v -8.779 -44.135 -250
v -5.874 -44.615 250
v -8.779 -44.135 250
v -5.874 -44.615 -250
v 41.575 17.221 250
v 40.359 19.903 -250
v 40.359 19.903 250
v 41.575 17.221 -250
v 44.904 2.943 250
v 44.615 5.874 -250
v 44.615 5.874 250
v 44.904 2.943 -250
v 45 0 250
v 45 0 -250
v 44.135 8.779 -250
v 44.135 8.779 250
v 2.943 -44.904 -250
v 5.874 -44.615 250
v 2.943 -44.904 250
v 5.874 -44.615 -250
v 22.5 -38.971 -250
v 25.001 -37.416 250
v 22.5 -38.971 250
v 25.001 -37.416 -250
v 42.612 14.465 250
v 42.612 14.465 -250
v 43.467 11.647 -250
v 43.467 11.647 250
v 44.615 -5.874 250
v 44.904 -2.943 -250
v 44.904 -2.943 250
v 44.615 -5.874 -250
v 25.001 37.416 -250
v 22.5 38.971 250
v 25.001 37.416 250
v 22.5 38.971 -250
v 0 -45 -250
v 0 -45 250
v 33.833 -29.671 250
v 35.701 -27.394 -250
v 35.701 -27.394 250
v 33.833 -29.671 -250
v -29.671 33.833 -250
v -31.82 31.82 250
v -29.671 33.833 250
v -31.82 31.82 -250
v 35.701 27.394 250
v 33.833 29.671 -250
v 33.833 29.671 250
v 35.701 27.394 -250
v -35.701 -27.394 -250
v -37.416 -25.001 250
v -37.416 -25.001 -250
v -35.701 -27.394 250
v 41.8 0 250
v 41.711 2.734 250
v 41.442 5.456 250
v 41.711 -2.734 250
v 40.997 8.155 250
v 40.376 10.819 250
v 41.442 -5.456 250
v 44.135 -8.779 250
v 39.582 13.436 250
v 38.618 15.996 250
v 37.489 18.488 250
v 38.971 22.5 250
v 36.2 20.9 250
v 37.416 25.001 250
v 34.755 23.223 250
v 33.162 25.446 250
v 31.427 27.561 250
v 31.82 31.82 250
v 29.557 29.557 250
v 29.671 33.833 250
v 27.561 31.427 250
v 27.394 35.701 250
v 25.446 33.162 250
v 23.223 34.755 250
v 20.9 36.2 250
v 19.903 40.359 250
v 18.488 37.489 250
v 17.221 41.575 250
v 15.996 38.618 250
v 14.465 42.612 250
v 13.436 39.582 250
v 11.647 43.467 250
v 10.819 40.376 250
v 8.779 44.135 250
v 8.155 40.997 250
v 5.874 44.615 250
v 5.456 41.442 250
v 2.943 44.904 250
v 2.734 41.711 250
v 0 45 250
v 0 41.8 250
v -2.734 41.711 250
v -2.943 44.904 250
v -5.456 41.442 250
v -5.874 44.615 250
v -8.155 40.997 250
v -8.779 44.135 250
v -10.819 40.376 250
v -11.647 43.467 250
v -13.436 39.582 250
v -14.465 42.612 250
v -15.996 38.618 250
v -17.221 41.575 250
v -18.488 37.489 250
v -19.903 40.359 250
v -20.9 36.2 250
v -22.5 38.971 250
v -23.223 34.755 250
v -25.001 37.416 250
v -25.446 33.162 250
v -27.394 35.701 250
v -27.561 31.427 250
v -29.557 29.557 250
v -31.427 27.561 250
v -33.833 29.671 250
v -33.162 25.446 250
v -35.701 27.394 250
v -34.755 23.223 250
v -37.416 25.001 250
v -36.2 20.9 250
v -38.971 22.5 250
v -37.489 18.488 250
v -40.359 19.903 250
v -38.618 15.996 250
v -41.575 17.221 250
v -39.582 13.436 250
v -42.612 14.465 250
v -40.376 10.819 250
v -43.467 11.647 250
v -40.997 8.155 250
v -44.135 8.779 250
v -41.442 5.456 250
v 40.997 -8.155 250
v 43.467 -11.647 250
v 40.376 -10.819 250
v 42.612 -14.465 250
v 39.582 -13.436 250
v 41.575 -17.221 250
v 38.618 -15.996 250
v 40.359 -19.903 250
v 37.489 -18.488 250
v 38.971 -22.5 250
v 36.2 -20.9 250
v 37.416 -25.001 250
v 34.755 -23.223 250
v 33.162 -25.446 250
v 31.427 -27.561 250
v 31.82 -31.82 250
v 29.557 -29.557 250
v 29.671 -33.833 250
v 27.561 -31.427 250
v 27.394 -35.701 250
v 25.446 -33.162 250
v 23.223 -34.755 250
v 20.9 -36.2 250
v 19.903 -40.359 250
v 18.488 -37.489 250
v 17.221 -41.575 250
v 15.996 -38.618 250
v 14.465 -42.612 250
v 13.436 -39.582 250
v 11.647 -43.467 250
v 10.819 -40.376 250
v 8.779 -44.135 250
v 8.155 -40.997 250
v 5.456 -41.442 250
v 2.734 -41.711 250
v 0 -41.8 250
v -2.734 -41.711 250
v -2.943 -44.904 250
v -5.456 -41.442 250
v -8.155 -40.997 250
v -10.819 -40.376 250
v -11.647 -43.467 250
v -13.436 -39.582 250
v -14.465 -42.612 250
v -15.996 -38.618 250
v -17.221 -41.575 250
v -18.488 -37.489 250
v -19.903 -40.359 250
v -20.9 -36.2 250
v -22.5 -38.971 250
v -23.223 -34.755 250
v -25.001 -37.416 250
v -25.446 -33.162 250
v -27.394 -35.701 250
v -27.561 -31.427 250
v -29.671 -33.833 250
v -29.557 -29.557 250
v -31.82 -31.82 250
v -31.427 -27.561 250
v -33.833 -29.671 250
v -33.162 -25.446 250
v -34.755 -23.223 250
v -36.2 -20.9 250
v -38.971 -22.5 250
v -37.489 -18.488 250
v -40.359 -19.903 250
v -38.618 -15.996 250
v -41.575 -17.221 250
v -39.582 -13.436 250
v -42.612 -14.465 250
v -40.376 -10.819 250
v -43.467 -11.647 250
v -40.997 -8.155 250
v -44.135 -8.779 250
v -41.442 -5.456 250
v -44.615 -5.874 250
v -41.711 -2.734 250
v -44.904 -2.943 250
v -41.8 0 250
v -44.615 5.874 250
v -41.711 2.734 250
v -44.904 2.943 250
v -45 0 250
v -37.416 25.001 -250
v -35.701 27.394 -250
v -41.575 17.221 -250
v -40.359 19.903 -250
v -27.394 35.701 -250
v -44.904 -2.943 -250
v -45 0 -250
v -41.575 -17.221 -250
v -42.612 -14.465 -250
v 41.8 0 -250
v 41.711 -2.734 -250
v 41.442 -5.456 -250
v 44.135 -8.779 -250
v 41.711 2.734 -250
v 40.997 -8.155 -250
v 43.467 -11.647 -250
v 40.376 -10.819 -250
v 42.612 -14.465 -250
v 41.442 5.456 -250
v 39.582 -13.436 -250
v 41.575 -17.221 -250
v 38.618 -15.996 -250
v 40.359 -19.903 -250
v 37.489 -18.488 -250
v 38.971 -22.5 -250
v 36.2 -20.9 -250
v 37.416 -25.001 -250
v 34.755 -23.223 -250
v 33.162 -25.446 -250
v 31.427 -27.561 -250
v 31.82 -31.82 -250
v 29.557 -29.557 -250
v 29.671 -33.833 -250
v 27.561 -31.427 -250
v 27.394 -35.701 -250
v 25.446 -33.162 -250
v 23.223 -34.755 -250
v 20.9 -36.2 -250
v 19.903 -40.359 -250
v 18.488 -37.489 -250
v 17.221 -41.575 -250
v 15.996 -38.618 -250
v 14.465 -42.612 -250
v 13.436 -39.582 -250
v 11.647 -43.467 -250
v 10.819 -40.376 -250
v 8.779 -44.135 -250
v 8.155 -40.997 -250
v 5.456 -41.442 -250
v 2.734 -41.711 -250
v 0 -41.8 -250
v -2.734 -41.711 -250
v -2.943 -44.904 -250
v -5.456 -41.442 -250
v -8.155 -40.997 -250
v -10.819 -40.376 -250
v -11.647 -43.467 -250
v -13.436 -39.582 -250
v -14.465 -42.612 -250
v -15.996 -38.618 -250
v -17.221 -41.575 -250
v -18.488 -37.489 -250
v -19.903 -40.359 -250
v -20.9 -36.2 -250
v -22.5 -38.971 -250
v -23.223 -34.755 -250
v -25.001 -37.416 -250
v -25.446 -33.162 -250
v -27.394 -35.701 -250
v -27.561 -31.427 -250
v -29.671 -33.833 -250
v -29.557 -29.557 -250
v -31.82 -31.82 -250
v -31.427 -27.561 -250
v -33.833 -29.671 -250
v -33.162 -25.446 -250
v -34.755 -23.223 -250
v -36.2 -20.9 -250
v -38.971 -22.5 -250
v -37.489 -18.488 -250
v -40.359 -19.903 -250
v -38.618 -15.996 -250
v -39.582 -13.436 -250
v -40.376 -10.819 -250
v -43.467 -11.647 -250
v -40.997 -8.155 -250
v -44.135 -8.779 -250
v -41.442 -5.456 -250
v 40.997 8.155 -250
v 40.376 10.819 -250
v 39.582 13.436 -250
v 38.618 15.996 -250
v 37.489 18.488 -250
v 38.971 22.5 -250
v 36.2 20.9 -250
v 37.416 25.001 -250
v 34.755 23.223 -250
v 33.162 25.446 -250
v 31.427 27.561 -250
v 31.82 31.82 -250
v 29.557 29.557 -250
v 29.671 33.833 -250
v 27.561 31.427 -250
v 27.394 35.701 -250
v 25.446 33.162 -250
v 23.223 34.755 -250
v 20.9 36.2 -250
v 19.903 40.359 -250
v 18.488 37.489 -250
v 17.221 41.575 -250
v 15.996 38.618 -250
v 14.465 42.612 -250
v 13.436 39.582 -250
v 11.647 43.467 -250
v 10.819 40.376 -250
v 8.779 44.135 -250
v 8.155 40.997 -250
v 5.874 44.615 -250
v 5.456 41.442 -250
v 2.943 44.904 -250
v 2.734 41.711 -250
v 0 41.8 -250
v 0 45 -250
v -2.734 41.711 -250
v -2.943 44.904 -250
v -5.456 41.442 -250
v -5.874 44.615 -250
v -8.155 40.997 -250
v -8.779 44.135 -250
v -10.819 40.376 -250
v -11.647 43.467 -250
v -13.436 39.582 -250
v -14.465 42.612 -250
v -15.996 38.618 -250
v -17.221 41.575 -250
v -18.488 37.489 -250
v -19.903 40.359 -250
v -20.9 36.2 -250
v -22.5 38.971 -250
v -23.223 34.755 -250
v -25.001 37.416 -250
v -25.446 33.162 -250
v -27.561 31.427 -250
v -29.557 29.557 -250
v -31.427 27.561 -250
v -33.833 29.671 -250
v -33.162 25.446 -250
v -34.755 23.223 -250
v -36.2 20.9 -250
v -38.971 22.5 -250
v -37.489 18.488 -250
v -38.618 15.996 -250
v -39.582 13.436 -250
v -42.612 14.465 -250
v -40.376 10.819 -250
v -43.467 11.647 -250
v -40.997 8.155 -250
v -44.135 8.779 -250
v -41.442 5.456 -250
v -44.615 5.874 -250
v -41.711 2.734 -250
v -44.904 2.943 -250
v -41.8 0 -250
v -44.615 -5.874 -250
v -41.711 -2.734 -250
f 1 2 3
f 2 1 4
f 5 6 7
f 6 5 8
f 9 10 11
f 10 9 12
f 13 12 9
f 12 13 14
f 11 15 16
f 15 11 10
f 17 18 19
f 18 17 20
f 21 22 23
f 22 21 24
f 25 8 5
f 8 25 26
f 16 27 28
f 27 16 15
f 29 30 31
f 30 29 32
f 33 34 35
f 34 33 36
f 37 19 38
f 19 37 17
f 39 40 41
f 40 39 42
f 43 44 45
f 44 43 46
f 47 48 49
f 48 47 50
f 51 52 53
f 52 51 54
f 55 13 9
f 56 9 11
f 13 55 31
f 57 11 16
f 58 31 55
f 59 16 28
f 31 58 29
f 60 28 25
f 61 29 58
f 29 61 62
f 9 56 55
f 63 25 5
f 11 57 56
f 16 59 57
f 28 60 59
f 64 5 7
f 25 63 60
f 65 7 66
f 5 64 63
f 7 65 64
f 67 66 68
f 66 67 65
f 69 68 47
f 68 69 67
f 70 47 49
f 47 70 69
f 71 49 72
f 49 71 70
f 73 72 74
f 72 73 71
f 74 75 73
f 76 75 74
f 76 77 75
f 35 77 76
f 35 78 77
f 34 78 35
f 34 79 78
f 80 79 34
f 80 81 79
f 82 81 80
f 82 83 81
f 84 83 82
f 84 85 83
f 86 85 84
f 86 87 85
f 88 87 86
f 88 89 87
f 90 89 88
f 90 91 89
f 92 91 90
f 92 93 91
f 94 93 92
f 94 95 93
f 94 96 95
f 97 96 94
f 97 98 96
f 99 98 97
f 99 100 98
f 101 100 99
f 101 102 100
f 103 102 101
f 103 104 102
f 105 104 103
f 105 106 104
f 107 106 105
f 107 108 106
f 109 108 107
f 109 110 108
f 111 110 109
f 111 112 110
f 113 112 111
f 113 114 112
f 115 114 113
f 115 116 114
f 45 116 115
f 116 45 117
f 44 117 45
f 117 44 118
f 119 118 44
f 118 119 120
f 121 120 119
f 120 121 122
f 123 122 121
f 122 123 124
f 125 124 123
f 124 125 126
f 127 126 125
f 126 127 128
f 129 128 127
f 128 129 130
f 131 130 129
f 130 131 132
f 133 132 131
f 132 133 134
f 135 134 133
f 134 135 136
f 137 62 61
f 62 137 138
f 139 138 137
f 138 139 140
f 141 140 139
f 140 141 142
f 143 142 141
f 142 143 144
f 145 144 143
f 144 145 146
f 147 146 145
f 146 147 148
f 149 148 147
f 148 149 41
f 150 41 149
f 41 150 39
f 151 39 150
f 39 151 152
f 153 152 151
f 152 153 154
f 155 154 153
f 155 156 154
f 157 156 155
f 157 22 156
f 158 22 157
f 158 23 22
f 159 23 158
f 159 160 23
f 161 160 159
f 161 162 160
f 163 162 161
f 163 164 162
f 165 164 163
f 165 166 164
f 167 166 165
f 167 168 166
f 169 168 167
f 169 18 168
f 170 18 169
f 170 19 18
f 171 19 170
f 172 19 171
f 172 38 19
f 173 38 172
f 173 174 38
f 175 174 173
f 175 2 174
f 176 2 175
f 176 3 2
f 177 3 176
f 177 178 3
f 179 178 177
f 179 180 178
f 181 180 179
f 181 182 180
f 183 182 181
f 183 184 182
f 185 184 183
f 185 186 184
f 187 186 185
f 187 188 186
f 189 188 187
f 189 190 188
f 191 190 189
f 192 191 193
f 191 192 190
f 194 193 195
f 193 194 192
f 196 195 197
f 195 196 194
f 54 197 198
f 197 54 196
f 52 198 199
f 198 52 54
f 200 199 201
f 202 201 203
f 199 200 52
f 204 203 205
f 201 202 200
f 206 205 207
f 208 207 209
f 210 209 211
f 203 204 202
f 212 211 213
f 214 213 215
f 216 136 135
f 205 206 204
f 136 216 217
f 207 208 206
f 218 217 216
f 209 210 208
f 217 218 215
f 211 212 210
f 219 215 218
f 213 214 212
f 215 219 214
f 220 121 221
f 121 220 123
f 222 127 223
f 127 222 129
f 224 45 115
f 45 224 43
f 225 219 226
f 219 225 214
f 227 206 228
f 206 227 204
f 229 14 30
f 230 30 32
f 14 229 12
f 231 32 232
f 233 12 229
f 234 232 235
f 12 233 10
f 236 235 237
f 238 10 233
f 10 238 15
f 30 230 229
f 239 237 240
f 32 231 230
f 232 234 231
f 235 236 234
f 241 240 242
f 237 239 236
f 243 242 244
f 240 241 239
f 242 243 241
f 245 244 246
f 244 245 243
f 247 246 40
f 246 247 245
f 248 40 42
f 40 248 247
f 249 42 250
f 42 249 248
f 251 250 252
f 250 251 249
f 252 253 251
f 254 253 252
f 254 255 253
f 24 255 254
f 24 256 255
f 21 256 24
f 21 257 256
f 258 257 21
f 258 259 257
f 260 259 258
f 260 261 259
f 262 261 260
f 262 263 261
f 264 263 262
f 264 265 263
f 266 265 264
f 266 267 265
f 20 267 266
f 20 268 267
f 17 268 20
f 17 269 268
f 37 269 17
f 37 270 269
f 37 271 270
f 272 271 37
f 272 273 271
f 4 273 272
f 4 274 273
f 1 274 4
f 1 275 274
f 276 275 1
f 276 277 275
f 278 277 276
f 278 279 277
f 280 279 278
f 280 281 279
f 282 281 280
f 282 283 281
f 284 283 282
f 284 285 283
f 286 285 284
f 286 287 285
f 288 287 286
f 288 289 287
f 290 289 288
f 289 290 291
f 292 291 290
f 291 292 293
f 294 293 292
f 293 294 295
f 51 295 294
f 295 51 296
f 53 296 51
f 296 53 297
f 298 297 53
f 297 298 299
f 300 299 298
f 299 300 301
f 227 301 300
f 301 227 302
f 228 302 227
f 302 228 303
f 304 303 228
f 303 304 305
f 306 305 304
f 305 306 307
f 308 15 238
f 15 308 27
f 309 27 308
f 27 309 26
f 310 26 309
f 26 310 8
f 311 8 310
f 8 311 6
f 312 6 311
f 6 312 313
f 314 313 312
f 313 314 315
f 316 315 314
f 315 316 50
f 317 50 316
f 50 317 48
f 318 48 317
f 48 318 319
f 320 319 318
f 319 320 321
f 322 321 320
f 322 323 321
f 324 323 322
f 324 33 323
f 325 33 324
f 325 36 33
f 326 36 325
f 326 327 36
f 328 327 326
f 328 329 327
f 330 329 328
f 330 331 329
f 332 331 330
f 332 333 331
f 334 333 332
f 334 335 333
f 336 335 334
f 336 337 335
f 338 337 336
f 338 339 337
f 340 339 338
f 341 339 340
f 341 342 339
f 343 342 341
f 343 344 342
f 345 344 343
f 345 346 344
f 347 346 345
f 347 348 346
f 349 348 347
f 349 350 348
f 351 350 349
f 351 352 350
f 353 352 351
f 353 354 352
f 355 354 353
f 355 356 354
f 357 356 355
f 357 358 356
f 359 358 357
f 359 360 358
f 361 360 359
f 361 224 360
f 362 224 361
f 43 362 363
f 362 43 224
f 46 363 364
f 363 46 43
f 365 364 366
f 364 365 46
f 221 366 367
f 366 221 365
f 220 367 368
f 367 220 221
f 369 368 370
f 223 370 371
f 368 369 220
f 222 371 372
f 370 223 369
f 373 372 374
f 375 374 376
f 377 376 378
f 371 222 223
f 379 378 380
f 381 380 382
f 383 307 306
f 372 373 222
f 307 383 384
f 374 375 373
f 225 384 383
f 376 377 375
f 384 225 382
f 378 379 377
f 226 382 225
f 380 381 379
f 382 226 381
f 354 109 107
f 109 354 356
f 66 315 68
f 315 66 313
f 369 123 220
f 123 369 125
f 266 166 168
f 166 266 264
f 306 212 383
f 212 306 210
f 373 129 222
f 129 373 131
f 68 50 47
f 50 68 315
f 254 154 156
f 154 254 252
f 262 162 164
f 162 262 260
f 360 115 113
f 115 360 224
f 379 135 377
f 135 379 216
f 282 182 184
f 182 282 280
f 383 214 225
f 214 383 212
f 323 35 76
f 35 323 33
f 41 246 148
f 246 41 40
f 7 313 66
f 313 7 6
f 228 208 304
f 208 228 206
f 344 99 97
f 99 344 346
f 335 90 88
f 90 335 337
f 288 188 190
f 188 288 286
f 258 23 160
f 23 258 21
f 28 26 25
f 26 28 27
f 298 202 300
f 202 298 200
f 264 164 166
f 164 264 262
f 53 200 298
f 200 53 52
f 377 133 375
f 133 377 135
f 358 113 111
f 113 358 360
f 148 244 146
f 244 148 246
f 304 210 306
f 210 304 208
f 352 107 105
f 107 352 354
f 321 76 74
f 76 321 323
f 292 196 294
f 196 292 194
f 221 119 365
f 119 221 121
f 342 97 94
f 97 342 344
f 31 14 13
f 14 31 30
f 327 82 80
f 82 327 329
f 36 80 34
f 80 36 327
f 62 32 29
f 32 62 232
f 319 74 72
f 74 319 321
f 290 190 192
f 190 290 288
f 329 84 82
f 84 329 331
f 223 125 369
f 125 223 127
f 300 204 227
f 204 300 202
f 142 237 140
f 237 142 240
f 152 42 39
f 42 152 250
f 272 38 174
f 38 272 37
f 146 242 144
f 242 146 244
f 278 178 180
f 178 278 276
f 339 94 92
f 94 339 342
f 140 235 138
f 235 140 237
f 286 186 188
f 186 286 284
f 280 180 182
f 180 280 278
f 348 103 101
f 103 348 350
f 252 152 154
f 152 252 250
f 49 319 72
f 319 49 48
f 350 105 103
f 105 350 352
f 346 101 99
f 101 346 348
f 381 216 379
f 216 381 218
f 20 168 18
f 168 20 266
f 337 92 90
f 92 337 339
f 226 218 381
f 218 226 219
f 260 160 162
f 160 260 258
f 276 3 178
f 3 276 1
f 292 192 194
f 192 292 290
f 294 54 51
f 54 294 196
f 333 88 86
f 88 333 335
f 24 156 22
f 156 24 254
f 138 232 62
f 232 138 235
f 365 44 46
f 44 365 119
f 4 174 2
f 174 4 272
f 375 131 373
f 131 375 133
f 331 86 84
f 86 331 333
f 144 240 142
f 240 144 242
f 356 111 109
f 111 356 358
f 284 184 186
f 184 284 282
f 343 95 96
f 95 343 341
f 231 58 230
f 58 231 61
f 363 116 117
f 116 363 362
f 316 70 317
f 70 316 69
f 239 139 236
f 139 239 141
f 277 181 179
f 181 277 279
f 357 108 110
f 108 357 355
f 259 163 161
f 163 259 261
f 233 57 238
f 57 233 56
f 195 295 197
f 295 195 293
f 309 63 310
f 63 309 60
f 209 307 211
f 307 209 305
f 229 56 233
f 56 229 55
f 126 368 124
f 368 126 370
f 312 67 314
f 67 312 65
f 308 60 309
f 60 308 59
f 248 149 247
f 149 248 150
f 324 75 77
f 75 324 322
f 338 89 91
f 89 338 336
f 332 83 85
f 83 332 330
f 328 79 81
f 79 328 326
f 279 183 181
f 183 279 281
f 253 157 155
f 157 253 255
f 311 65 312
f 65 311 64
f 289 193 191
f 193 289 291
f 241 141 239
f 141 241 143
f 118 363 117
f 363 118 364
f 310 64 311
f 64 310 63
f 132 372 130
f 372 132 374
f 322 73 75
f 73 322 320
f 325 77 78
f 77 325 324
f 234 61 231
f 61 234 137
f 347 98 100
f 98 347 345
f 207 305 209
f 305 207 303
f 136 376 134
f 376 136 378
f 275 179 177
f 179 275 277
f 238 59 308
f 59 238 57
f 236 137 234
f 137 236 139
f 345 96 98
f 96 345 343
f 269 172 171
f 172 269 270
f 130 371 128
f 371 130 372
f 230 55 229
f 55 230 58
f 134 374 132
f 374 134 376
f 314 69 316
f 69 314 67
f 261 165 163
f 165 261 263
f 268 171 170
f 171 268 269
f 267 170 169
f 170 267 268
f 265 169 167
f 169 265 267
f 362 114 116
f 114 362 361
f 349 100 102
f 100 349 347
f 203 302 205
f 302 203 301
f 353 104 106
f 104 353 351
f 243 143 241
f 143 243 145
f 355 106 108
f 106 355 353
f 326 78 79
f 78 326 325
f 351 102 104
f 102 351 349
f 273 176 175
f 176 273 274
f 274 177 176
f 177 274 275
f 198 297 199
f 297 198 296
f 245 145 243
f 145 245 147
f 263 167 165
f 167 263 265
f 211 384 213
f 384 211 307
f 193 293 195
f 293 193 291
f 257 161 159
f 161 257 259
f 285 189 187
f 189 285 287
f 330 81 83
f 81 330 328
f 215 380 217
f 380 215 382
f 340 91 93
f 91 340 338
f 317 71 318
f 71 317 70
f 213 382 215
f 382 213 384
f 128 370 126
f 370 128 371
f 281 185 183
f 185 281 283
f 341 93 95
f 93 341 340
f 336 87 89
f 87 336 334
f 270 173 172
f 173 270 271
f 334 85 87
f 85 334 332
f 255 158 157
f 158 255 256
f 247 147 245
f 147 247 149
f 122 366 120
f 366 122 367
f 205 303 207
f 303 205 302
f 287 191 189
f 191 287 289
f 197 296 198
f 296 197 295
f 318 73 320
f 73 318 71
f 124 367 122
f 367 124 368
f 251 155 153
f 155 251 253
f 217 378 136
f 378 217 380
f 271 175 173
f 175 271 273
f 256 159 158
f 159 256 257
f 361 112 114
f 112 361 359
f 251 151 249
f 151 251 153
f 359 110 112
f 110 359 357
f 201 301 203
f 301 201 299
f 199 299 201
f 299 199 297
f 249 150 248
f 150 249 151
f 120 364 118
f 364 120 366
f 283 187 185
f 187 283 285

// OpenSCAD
$fn=96;

pipe_length = 500;
outer_d = 90;
wall = 3.2;

inner_d = outer_d - 2*wall;

module ht_pipe(len, od, id){
    difference(){
        cylinder(h=len, d=od, center=true);
        cylinder(h=len+2, d=id, center=true);
    }
}

ht_pipe(pipe_length, outer_d, inner_d);
